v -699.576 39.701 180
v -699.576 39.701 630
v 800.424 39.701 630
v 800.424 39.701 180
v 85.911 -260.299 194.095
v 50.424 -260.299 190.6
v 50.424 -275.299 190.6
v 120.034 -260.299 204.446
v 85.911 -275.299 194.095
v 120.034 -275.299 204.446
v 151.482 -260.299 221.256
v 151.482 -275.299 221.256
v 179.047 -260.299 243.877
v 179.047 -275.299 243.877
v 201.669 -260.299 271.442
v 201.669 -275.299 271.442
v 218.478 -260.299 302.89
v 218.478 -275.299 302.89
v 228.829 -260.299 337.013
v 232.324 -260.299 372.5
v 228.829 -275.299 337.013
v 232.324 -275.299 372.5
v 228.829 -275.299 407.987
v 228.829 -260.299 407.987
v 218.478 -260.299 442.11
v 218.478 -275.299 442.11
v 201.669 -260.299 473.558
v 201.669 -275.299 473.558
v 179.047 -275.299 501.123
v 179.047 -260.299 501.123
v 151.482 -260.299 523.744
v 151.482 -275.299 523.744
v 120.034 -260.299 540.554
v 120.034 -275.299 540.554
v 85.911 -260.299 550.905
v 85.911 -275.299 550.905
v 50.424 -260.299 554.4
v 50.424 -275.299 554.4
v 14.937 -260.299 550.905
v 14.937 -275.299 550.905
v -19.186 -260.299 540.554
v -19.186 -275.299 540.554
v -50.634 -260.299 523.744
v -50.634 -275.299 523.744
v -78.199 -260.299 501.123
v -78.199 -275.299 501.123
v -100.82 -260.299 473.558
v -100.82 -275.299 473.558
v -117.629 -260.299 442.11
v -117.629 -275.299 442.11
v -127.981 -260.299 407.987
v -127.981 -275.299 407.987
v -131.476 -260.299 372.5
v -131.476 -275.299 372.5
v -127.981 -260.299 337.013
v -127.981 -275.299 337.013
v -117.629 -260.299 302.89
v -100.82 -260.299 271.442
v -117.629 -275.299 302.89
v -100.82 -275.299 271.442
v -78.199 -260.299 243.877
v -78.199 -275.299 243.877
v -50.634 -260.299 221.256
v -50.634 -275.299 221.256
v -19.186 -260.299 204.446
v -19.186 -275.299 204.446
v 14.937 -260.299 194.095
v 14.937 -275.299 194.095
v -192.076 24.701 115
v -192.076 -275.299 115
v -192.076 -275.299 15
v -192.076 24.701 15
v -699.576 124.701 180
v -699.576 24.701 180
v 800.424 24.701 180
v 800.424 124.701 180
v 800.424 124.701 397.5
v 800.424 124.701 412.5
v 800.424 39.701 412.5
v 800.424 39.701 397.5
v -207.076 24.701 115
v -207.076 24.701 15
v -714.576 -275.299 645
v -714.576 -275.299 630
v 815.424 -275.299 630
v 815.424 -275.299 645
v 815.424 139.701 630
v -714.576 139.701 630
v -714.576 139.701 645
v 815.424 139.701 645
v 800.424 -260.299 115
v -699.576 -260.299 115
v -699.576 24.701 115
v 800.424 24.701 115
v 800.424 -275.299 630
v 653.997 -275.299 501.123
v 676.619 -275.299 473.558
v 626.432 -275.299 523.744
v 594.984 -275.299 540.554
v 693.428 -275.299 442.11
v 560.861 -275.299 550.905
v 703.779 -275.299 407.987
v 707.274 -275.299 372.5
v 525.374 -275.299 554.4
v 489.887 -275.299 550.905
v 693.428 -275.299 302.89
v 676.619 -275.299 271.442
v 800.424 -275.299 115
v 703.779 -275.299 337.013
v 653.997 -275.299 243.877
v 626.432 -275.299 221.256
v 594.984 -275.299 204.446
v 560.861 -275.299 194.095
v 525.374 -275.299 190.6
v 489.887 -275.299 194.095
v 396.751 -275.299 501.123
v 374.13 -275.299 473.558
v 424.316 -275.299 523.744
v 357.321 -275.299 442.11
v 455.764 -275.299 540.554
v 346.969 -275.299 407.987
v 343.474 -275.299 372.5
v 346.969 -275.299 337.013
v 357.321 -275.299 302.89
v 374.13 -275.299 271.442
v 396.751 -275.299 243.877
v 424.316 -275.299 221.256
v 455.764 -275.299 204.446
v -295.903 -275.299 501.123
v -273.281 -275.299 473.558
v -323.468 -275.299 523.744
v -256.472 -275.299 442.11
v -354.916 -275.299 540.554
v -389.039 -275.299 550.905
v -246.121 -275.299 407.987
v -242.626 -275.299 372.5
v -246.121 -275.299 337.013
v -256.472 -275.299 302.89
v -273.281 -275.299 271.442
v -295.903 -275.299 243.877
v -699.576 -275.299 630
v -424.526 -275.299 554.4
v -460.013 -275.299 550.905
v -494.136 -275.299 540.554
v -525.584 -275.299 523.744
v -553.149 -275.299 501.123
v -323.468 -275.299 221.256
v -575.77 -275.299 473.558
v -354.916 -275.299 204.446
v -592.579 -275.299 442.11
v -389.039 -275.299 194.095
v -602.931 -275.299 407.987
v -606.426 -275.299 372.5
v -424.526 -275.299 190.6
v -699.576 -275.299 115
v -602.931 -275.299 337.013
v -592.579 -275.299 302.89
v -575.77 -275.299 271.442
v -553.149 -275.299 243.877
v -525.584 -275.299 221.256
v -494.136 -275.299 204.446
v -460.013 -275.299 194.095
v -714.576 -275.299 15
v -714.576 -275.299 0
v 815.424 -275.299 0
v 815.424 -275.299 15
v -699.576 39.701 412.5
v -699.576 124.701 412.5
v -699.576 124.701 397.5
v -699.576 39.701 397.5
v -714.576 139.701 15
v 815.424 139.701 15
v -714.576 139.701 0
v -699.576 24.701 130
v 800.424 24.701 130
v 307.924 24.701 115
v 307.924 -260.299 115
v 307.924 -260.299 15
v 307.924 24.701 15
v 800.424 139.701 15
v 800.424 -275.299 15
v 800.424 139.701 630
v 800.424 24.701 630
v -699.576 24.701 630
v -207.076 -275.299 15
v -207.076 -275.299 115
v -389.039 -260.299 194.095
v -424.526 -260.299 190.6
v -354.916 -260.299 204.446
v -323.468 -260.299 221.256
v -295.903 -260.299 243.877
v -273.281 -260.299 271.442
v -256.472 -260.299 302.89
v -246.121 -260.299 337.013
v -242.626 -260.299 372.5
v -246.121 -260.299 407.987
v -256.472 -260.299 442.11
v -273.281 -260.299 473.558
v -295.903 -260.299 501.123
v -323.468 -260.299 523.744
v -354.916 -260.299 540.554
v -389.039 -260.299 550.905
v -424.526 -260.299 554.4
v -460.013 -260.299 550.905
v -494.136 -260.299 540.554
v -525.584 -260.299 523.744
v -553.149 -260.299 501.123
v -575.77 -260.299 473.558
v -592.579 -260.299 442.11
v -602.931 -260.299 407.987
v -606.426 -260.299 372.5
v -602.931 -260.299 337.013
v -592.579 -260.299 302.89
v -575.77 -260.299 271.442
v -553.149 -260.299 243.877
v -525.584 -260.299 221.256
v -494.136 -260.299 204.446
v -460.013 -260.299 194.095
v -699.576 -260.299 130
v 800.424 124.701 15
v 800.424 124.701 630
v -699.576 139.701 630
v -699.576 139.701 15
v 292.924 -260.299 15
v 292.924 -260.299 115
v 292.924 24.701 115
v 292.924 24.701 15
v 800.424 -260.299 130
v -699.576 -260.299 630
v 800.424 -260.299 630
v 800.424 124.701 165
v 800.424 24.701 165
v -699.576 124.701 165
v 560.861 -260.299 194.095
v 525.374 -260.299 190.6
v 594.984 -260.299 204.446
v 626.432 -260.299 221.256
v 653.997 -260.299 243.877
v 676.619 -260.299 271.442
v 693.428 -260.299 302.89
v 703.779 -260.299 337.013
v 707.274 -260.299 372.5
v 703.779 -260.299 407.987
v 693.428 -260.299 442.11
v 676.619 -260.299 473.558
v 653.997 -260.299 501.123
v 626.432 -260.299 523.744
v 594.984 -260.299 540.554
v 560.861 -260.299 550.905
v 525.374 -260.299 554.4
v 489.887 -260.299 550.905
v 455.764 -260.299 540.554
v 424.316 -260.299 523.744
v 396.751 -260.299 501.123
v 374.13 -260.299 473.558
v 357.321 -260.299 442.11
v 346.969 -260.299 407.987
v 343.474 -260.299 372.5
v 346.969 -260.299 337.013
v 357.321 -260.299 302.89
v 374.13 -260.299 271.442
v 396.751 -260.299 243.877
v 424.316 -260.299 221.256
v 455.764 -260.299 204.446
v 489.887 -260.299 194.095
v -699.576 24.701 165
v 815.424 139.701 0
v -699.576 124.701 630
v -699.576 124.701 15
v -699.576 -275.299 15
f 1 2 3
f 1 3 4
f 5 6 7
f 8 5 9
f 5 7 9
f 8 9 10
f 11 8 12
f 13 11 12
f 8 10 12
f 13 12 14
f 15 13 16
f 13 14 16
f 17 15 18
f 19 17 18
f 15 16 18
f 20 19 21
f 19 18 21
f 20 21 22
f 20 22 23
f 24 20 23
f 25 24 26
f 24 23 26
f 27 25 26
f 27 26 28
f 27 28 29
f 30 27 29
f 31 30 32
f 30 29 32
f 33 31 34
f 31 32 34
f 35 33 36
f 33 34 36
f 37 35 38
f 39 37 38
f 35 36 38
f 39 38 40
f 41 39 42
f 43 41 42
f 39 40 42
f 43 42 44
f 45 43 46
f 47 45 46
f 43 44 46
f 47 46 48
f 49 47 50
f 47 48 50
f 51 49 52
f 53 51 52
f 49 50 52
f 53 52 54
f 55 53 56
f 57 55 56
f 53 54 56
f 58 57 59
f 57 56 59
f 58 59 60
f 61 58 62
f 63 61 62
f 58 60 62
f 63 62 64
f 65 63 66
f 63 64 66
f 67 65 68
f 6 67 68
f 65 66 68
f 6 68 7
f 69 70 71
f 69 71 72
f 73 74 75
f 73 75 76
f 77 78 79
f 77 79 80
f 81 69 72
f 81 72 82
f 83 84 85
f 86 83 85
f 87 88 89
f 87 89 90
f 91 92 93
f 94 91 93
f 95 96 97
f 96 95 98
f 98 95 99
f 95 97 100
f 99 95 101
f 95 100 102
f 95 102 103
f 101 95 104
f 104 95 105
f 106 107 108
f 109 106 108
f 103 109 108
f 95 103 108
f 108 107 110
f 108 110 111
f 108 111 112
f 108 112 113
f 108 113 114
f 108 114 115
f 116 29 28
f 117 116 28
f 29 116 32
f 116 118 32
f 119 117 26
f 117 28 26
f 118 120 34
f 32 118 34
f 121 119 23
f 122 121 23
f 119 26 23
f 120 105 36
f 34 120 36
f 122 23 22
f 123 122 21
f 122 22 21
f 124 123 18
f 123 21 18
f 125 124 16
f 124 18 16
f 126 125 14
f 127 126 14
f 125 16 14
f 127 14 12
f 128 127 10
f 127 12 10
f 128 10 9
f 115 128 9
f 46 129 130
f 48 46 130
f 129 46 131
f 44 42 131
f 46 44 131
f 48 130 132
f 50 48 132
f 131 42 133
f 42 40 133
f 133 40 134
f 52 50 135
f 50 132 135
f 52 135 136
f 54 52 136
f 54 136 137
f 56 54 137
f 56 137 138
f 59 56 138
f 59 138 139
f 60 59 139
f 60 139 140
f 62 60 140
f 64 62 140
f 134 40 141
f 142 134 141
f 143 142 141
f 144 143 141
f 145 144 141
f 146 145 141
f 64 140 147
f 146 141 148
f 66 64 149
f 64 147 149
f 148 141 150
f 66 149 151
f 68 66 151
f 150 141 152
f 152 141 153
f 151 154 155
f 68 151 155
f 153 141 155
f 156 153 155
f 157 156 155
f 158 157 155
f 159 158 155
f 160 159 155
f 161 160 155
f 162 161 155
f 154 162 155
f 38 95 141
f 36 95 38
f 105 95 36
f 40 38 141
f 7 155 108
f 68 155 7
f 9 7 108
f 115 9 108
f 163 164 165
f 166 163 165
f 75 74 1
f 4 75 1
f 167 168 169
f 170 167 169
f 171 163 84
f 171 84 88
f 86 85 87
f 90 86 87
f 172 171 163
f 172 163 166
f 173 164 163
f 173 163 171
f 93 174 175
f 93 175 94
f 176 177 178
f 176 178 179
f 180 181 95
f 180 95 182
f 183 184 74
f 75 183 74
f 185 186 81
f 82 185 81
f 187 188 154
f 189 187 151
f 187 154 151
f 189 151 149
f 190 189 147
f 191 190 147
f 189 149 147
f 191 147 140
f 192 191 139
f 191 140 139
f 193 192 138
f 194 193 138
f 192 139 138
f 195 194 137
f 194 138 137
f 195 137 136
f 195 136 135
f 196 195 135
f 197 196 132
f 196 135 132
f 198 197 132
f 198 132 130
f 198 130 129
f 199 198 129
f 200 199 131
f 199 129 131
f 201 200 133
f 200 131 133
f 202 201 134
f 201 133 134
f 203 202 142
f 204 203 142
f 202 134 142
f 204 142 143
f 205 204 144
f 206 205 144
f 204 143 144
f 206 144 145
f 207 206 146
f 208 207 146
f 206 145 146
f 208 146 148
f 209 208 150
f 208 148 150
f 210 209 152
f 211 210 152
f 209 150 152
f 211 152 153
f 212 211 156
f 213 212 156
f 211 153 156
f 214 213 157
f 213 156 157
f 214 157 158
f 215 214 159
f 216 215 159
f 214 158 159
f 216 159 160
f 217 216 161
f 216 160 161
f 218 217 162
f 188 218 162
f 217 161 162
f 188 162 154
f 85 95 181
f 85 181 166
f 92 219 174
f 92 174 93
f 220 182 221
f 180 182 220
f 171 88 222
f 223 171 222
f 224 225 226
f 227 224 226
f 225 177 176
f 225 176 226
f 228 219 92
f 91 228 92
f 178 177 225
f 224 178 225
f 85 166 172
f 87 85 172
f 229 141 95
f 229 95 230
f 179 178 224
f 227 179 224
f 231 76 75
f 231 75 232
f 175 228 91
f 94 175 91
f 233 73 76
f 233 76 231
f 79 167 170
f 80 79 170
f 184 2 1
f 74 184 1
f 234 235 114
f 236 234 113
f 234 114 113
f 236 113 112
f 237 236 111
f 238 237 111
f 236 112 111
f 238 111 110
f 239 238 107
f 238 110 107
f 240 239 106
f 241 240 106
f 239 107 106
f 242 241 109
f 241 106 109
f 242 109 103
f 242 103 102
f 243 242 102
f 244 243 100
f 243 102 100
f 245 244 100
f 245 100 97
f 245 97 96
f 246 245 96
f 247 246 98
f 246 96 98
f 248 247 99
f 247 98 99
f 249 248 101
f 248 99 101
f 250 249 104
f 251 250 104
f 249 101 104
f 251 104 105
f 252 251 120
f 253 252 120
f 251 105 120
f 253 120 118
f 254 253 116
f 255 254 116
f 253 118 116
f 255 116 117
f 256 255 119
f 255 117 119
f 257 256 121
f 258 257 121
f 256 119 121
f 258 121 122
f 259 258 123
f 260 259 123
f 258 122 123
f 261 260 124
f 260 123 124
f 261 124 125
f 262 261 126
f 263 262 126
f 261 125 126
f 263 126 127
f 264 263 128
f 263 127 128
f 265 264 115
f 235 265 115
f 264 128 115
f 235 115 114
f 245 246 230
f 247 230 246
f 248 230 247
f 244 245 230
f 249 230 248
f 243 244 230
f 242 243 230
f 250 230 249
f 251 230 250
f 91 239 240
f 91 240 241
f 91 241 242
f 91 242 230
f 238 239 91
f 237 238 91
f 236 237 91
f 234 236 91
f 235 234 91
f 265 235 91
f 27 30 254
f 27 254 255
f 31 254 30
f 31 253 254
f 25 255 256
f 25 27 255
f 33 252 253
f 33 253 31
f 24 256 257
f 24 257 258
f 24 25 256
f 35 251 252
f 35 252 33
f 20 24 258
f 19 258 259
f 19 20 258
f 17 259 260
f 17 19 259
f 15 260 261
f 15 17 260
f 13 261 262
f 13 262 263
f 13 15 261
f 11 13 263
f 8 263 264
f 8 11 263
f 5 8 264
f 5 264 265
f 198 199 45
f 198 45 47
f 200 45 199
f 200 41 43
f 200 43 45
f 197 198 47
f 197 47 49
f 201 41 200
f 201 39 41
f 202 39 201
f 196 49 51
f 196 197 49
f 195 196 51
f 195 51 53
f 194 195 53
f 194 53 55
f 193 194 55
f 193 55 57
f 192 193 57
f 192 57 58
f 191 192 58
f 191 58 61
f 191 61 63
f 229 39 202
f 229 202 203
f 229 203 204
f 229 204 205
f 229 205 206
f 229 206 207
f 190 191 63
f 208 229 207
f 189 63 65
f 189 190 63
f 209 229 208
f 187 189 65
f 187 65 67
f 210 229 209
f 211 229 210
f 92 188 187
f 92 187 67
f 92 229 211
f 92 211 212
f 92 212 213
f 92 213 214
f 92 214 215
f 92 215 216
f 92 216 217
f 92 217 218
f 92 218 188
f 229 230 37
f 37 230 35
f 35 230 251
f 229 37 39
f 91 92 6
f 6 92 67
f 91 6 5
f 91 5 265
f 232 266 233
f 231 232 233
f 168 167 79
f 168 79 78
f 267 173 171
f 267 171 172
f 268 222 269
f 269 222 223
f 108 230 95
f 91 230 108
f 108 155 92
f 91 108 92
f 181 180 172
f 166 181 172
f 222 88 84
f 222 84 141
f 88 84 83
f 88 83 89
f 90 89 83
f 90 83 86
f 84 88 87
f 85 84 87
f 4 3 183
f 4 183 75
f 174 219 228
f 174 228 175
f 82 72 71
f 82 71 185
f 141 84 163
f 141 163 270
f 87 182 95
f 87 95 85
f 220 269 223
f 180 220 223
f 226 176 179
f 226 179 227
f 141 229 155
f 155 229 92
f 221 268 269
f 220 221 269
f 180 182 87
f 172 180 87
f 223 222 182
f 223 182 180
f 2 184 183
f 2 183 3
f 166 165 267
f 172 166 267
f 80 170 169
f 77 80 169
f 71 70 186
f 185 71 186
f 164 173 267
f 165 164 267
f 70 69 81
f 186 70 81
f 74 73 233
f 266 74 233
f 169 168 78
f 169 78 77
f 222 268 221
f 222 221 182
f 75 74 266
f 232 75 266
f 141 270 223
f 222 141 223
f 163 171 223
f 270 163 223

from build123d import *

# Parameters (mm, degrees)
ESQUISSE1_W             = 1530
ESQUISSE1_H             = 415
BOSS_EXTRU_1_DEPTH      = 15
ESQUISSE2_W             = 15
ESQUISSE2_H             = 415
EXTRU_MINCE1_DEPTH      = 615
EXTRU_MINCE1_2_DEPTH    = 615
ESQUISSE3_W             = 615
ESQUISSE3_H             = 15
EXTRU_MINCE2_DEPTH      = 1500
ESQUISSE5_W             = 15
ESQUISSE5_H             = 100
BOSS_EXTRU_2_DEPTH      = 1500
ESQUISSE8_W             = 450
ESQUISSE8_H             = 15
BOSS_EXTRU_3_DEPTH      = 1500
ESQUISSE9_W             = 515
ESQUISSE9_H             = 15
BOSS_EXTRU_4_DEPTH      = 1500
ESQUISSE10_W            = 15
ESQUISSE10_H            = 285
BOSS_EXTRU_5_DEPTH      = 1500
ESQUISSE12_W            = 15
ESQUISSE12_H            = 300
BOSS_EXTRU_6_DEPTH      = 100
ESQUISSE12_H_2          = 285
BOSS_EXTRU_6_2_DEPTH    = 100
ESQUISSE13_R            = 181.9
ENL_V_MAT_EXTRU_1_DEPTH = 15
ESQUISSE14_W            = 1530
ESQUISSE14_H            = 415
BOSS_EXTRU_7_DEPTH      = 15
ESQUISSE16_W            = 15
ESQUISSE16_H            = 85
BOSS_EXTRU_8_DEPTH      = 1500


with BuildPart() as part:
    # Esquisse1 → Boss.-Extru.1 (new body)
    with BuildSketch(Plane.XY):
        with Locations((50.424193548, -67.799193548)):
            Rectangle(ESQUISSE1_W, ESQUISSE1_H)
    extrude(amount=BOSS_EXTRU_1_DEPTH)


with BuildPart() as body_2:
    # Esquisse2 → Extru.-Mince1 (new body)
    with BuildSketch(Plane.XY.offset(15)):
        with Locations((-707.075806452, -67.799193548)):
            Rectangle(ESQUISSE2_W, ESQUISSE2_H)
    extrude(amount=EXTRU_MINCE1_DEPTH)


with BuildPart() as body_3:
    # Esquisse2 → Extru.-Mince1 2 (new body)
    with BuildSketch(Plane.XY.offset(15)):
        with Locations((807.924193548, -67.799193548)):
            Rectangle(ESQUISSE2_W, ESQUISSE2_H)
    extrude(amount=EXTRU_MINCE1_2_DEPTH)


with BuildPart() as body_4:
    # Esquisse3 → Extru.-Mince2 (new body)
    with BuildSketch(Plane(origin=(-699.575806452, 0, 0), x_dir=(0, 0, -1), z_dir=(1, 0, 0))):
        with Locations((-322.5, 132.200806452)):
            Rectangle(ESQUISSE3_W, ESQUISSE3_H)
    extrude(amount=EXTRU_MINCE2_DEPTH)


with BuildPart() as body_5:
    # Esquisse5 → Boss.-Extru.2 (new body)
    with BuildSketch(Plane(origin=(-699.575806452, 0, 0), x_dir=(0, 0, -1), z_dir=(1, 0, 0))):
        with Locations((-172.5, 74.700806452)):
            Rectangle(ESQUISSE5_W, ESQUISSE5_H)
    extrude(amount=BOSS_EXTRU_2_DEPTH)


with BuildPart() as body_6:
    # Esquisse8 → Boss.-Extru.3 (new body)
    with BuildSketch(Plane(origin=(-699.575806452, 0, 0), x_dir=(0, 0, -1), z_dir=(1, 0, 0))):
        with Locations((-405, 32.200806452)):
            Rectangle(ESQUISSE8_W, ESQUISSE8_H)
    extrude(amount=BOSS_EXTRU_3_DEPTH)


with BuildPart() as body_7:
    # Esquisse9 → Boss.-Extru.4 (new body)
    with BuildSketch(Plane(origin=(-699.575806452, 0, 0), x_dir=(0, 0, -1), z_dir=(1, 0, 0))):
        with Locations((-372.5, -267.799193548)):
            Rectangle(ESQUISSE9_W, ESQUISSE9_H)
    extrude(amount=BOSS_EXTRU_4_DEPTH)

    # Esquisse13 → Enlèv. mat.-Extru.1 (cut)
    with BuildSketch(Plane.XZ.offset(275.299193548)):
        with Locations(Location((50.424193548, 372.5, 0), (0, 0, 270))):
            Circle(ESQUISSE13_R)
        with Locations(Location((-424.525806452, 372.5, 0), (0, 0, 270))):
            Circle(ESQUISSE13_R)
        with Locations(Location((525.374193548, 372.5, 0), (0, 0, 270))):
            Circle(ESQUISSE13_R)
    extrude(amount=-ENL_V_MAT_EXTRU_1_DEPTH, mode=Mode.SUBTRACT)


with BuildPart() as body_8:
    # Esquisse10 → Boss.-Extru.5 (new body)
    with BuildSketch(Plane(origin=(-699.575806452, 0, 0), x_dir=(0, 0, -1), z_dir=(1, 0, 0))):
        with Locations((-122.5, -117.799193548)):
            Rectangle(ESQUISSE10_W, ESQUISSE10_H)
    extrude(amount=BOSS_EXTRU_5_DEPTH)


with BuildPart() as body_9:
    # Esquisse12 → Boss.-Extru.6 (new body)
    with BuildSketch(Plane(origin=(0, 0, 115), x_dir=(-1, 0, 0), z_dir=(0, 0, -1))):
        with Locations((199.575806452, -125.299193548)):
            Rectangle(ESQUISSE12_W, ESQUISSE12_H)
    extrude(amount=BOSS_EXTRU_6_DEPTH)


with BuildPart() as body_10:
    # Esquisse12 → Boss.-Extru.6 2 (new body)
    with BuildSketch(Plane(origin=(0, 0, 115), x_dir=(-1, 0, 0), z_dir=(0, 0, -1))):
        with Locations((-300.424193548, -117.799193548)):
            Rectangle(ESQUISSE12_W, ESQUISSE12_H_2)
    extrude(amount=BOSS_EXTRU_6_2_DEPTH)


with BuildPart() as body_11:
    # Esquisse14 → Boss.-Extru.7 (new body)
    with BuildSketch(Plane.XY.offset(630)):
        with Locations((50.424193548, -67.799193548)):
            Rectangle(ESQUISSE14_W, ESQUISSE14_H)
    extrude(amount=BOSS_EXTRU_7_DEPTH)


with BuildPart() as body_12:
    # Esquisse16 → Boss.-Extru.8 (new body)
    with BuildSketch(Plane(origin=(-699.575806452, 0, 0), x_dir=(0, 0, -1), z_dir=(1, 0, 0))):
        with Locations((-405, 82.200806452)):
            Rectangle(ESQUISSE16_W, ESQUISSE16_H)
    extrude(amount=BOSS_EXTRU_8_DEPTH)


solid = Compound([part.part, body_2.part, body_3.part, body_4.part, body_5.part, body_6.part, body_7.part, body_8.part, body_9.part, body_10.part, body_11.part, body_12.part])
